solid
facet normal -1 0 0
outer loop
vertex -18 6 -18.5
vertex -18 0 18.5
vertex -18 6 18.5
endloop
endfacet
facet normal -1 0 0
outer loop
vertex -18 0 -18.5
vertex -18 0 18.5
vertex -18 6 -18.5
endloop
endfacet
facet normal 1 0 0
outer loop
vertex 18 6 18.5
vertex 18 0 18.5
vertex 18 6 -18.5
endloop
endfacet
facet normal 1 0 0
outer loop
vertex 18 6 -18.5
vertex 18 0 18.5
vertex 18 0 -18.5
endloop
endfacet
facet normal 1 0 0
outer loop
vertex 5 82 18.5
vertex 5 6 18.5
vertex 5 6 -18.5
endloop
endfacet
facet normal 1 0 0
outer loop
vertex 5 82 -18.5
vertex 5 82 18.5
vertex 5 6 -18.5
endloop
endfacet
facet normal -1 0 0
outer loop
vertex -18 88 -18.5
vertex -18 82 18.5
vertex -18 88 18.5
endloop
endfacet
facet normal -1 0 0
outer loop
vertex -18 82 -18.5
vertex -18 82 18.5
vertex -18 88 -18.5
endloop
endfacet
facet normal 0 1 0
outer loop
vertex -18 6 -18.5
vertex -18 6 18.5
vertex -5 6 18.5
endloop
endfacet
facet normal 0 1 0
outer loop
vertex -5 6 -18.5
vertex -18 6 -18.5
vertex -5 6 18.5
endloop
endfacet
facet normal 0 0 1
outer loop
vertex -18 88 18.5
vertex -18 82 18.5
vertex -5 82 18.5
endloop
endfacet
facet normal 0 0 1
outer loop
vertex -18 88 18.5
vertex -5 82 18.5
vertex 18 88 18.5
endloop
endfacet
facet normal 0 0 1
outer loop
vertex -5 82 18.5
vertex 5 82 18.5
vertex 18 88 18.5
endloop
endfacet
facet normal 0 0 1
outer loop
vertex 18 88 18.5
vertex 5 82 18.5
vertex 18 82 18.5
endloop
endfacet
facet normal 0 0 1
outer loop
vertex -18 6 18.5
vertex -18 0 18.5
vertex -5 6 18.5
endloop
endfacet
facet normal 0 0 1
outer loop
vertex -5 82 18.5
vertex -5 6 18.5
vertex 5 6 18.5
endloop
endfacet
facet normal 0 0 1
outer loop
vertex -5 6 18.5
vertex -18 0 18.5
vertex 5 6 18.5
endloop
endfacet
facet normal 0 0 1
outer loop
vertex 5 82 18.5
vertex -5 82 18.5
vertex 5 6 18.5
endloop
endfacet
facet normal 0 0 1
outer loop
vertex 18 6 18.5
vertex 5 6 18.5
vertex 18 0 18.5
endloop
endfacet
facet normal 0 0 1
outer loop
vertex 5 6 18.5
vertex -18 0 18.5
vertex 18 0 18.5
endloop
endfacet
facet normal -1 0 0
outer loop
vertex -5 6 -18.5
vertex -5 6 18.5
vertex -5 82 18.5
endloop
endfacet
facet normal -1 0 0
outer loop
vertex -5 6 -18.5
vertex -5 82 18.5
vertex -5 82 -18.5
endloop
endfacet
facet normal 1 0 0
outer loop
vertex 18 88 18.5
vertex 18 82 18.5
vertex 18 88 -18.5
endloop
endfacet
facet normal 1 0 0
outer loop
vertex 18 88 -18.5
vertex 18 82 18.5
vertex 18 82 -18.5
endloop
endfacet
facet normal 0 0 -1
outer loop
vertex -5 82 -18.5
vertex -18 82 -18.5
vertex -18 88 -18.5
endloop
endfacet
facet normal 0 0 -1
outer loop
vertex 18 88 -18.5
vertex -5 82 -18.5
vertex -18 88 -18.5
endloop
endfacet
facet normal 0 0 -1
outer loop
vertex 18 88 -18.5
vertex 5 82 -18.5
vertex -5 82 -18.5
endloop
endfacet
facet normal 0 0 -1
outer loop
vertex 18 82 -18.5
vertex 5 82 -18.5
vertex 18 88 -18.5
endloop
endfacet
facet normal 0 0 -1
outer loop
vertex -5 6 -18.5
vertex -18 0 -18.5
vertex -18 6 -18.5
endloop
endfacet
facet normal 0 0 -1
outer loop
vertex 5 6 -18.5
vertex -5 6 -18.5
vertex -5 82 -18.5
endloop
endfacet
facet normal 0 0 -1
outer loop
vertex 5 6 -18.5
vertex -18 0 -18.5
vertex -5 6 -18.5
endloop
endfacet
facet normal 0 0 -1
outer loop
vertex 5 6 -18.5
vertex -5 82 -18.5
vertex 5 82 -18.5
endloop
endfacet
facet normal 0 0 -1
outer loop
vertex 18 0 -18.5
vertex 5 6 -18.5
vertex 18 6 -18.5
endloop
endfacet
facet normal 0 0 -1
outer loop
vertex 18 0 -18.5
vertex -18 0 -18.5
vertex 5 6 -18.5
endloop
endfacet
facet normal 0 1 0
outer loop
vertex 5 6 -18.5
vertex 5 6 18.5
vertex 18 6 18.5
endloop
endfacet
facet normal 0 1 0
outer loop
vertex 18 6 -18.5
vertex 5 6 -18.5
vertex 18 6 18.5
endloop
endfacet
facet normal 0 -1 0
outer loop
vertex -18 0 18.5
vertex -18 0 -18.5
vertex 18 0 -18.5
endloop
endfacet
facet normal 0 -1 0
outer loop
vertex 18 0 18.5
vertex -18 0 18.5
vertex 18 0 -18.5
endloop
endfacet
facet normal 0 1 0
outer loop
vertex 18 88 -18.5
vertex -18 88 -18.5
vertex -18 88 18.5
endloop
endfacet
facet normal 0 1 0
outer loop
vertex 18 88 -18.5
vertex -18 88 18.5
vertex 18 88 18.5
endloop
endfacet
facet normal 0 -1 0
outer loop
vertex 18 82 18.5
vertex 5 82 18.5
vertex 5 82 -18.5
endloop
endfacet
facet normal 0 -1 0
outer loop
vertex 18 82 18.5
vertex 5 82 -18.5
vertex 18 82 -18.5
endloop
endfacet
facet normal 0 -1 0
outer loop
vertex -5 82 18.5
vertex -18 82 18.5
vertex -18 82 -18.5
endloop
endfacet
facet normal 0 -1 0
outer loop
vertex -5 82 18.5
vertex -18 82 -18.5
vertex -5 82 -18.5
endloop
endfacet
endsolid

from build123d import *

# Parameters (mm, degrees)
SKETCH_1_W      = 36
SKETCH_1_H      = 37
EXTRUDE_1_DEPTH = 6
SKETCH_2_W      = 10
SKETCH_2_H      = 37
EXTRUDE_2_DEPTH = 76
SKETCH_3_W      = 36
SKETCH_3_H      = 37
EXTRUDE_3_DEPTH = 6


with BuildPart() as part:
    # 草图1 → 凸台-拉伸1 (new body)
    with BuildSketch(Plane(origin=(0, 0, 0), x_dir=(1, 0, 0), z_dir=(0, 1, 0))):
        Rectangle(SKETCH_1_W, SKETCH_1_H)
    extrude(amount=EXTRUDE_1_DEPTH)

    # 草图2 → 凸台-拉伸2 (add)
    with BuildSketch(Plane(origin=(0, 6, 0), x_dir=(1, 0, 0), z_dir=(0, 1, 0))):
        Rectangle(SKETCH_2_W, SKETCH_2_H)
    extrude(amount=EXTRUDE_2_DEPTH)

    # 草图3 → 凸台-拉伸3 (add)
    with BuildSketch(Plane(origin=(0, 82, 0), x_dir=(1, 0, 0), z_dir=(0, 1, 0))):
        Rectangle(SKETCH_3_W, SKETCH_3_H)
    extrude(amount=EXTRUDE_3_DEPTH)


solid = part.part
